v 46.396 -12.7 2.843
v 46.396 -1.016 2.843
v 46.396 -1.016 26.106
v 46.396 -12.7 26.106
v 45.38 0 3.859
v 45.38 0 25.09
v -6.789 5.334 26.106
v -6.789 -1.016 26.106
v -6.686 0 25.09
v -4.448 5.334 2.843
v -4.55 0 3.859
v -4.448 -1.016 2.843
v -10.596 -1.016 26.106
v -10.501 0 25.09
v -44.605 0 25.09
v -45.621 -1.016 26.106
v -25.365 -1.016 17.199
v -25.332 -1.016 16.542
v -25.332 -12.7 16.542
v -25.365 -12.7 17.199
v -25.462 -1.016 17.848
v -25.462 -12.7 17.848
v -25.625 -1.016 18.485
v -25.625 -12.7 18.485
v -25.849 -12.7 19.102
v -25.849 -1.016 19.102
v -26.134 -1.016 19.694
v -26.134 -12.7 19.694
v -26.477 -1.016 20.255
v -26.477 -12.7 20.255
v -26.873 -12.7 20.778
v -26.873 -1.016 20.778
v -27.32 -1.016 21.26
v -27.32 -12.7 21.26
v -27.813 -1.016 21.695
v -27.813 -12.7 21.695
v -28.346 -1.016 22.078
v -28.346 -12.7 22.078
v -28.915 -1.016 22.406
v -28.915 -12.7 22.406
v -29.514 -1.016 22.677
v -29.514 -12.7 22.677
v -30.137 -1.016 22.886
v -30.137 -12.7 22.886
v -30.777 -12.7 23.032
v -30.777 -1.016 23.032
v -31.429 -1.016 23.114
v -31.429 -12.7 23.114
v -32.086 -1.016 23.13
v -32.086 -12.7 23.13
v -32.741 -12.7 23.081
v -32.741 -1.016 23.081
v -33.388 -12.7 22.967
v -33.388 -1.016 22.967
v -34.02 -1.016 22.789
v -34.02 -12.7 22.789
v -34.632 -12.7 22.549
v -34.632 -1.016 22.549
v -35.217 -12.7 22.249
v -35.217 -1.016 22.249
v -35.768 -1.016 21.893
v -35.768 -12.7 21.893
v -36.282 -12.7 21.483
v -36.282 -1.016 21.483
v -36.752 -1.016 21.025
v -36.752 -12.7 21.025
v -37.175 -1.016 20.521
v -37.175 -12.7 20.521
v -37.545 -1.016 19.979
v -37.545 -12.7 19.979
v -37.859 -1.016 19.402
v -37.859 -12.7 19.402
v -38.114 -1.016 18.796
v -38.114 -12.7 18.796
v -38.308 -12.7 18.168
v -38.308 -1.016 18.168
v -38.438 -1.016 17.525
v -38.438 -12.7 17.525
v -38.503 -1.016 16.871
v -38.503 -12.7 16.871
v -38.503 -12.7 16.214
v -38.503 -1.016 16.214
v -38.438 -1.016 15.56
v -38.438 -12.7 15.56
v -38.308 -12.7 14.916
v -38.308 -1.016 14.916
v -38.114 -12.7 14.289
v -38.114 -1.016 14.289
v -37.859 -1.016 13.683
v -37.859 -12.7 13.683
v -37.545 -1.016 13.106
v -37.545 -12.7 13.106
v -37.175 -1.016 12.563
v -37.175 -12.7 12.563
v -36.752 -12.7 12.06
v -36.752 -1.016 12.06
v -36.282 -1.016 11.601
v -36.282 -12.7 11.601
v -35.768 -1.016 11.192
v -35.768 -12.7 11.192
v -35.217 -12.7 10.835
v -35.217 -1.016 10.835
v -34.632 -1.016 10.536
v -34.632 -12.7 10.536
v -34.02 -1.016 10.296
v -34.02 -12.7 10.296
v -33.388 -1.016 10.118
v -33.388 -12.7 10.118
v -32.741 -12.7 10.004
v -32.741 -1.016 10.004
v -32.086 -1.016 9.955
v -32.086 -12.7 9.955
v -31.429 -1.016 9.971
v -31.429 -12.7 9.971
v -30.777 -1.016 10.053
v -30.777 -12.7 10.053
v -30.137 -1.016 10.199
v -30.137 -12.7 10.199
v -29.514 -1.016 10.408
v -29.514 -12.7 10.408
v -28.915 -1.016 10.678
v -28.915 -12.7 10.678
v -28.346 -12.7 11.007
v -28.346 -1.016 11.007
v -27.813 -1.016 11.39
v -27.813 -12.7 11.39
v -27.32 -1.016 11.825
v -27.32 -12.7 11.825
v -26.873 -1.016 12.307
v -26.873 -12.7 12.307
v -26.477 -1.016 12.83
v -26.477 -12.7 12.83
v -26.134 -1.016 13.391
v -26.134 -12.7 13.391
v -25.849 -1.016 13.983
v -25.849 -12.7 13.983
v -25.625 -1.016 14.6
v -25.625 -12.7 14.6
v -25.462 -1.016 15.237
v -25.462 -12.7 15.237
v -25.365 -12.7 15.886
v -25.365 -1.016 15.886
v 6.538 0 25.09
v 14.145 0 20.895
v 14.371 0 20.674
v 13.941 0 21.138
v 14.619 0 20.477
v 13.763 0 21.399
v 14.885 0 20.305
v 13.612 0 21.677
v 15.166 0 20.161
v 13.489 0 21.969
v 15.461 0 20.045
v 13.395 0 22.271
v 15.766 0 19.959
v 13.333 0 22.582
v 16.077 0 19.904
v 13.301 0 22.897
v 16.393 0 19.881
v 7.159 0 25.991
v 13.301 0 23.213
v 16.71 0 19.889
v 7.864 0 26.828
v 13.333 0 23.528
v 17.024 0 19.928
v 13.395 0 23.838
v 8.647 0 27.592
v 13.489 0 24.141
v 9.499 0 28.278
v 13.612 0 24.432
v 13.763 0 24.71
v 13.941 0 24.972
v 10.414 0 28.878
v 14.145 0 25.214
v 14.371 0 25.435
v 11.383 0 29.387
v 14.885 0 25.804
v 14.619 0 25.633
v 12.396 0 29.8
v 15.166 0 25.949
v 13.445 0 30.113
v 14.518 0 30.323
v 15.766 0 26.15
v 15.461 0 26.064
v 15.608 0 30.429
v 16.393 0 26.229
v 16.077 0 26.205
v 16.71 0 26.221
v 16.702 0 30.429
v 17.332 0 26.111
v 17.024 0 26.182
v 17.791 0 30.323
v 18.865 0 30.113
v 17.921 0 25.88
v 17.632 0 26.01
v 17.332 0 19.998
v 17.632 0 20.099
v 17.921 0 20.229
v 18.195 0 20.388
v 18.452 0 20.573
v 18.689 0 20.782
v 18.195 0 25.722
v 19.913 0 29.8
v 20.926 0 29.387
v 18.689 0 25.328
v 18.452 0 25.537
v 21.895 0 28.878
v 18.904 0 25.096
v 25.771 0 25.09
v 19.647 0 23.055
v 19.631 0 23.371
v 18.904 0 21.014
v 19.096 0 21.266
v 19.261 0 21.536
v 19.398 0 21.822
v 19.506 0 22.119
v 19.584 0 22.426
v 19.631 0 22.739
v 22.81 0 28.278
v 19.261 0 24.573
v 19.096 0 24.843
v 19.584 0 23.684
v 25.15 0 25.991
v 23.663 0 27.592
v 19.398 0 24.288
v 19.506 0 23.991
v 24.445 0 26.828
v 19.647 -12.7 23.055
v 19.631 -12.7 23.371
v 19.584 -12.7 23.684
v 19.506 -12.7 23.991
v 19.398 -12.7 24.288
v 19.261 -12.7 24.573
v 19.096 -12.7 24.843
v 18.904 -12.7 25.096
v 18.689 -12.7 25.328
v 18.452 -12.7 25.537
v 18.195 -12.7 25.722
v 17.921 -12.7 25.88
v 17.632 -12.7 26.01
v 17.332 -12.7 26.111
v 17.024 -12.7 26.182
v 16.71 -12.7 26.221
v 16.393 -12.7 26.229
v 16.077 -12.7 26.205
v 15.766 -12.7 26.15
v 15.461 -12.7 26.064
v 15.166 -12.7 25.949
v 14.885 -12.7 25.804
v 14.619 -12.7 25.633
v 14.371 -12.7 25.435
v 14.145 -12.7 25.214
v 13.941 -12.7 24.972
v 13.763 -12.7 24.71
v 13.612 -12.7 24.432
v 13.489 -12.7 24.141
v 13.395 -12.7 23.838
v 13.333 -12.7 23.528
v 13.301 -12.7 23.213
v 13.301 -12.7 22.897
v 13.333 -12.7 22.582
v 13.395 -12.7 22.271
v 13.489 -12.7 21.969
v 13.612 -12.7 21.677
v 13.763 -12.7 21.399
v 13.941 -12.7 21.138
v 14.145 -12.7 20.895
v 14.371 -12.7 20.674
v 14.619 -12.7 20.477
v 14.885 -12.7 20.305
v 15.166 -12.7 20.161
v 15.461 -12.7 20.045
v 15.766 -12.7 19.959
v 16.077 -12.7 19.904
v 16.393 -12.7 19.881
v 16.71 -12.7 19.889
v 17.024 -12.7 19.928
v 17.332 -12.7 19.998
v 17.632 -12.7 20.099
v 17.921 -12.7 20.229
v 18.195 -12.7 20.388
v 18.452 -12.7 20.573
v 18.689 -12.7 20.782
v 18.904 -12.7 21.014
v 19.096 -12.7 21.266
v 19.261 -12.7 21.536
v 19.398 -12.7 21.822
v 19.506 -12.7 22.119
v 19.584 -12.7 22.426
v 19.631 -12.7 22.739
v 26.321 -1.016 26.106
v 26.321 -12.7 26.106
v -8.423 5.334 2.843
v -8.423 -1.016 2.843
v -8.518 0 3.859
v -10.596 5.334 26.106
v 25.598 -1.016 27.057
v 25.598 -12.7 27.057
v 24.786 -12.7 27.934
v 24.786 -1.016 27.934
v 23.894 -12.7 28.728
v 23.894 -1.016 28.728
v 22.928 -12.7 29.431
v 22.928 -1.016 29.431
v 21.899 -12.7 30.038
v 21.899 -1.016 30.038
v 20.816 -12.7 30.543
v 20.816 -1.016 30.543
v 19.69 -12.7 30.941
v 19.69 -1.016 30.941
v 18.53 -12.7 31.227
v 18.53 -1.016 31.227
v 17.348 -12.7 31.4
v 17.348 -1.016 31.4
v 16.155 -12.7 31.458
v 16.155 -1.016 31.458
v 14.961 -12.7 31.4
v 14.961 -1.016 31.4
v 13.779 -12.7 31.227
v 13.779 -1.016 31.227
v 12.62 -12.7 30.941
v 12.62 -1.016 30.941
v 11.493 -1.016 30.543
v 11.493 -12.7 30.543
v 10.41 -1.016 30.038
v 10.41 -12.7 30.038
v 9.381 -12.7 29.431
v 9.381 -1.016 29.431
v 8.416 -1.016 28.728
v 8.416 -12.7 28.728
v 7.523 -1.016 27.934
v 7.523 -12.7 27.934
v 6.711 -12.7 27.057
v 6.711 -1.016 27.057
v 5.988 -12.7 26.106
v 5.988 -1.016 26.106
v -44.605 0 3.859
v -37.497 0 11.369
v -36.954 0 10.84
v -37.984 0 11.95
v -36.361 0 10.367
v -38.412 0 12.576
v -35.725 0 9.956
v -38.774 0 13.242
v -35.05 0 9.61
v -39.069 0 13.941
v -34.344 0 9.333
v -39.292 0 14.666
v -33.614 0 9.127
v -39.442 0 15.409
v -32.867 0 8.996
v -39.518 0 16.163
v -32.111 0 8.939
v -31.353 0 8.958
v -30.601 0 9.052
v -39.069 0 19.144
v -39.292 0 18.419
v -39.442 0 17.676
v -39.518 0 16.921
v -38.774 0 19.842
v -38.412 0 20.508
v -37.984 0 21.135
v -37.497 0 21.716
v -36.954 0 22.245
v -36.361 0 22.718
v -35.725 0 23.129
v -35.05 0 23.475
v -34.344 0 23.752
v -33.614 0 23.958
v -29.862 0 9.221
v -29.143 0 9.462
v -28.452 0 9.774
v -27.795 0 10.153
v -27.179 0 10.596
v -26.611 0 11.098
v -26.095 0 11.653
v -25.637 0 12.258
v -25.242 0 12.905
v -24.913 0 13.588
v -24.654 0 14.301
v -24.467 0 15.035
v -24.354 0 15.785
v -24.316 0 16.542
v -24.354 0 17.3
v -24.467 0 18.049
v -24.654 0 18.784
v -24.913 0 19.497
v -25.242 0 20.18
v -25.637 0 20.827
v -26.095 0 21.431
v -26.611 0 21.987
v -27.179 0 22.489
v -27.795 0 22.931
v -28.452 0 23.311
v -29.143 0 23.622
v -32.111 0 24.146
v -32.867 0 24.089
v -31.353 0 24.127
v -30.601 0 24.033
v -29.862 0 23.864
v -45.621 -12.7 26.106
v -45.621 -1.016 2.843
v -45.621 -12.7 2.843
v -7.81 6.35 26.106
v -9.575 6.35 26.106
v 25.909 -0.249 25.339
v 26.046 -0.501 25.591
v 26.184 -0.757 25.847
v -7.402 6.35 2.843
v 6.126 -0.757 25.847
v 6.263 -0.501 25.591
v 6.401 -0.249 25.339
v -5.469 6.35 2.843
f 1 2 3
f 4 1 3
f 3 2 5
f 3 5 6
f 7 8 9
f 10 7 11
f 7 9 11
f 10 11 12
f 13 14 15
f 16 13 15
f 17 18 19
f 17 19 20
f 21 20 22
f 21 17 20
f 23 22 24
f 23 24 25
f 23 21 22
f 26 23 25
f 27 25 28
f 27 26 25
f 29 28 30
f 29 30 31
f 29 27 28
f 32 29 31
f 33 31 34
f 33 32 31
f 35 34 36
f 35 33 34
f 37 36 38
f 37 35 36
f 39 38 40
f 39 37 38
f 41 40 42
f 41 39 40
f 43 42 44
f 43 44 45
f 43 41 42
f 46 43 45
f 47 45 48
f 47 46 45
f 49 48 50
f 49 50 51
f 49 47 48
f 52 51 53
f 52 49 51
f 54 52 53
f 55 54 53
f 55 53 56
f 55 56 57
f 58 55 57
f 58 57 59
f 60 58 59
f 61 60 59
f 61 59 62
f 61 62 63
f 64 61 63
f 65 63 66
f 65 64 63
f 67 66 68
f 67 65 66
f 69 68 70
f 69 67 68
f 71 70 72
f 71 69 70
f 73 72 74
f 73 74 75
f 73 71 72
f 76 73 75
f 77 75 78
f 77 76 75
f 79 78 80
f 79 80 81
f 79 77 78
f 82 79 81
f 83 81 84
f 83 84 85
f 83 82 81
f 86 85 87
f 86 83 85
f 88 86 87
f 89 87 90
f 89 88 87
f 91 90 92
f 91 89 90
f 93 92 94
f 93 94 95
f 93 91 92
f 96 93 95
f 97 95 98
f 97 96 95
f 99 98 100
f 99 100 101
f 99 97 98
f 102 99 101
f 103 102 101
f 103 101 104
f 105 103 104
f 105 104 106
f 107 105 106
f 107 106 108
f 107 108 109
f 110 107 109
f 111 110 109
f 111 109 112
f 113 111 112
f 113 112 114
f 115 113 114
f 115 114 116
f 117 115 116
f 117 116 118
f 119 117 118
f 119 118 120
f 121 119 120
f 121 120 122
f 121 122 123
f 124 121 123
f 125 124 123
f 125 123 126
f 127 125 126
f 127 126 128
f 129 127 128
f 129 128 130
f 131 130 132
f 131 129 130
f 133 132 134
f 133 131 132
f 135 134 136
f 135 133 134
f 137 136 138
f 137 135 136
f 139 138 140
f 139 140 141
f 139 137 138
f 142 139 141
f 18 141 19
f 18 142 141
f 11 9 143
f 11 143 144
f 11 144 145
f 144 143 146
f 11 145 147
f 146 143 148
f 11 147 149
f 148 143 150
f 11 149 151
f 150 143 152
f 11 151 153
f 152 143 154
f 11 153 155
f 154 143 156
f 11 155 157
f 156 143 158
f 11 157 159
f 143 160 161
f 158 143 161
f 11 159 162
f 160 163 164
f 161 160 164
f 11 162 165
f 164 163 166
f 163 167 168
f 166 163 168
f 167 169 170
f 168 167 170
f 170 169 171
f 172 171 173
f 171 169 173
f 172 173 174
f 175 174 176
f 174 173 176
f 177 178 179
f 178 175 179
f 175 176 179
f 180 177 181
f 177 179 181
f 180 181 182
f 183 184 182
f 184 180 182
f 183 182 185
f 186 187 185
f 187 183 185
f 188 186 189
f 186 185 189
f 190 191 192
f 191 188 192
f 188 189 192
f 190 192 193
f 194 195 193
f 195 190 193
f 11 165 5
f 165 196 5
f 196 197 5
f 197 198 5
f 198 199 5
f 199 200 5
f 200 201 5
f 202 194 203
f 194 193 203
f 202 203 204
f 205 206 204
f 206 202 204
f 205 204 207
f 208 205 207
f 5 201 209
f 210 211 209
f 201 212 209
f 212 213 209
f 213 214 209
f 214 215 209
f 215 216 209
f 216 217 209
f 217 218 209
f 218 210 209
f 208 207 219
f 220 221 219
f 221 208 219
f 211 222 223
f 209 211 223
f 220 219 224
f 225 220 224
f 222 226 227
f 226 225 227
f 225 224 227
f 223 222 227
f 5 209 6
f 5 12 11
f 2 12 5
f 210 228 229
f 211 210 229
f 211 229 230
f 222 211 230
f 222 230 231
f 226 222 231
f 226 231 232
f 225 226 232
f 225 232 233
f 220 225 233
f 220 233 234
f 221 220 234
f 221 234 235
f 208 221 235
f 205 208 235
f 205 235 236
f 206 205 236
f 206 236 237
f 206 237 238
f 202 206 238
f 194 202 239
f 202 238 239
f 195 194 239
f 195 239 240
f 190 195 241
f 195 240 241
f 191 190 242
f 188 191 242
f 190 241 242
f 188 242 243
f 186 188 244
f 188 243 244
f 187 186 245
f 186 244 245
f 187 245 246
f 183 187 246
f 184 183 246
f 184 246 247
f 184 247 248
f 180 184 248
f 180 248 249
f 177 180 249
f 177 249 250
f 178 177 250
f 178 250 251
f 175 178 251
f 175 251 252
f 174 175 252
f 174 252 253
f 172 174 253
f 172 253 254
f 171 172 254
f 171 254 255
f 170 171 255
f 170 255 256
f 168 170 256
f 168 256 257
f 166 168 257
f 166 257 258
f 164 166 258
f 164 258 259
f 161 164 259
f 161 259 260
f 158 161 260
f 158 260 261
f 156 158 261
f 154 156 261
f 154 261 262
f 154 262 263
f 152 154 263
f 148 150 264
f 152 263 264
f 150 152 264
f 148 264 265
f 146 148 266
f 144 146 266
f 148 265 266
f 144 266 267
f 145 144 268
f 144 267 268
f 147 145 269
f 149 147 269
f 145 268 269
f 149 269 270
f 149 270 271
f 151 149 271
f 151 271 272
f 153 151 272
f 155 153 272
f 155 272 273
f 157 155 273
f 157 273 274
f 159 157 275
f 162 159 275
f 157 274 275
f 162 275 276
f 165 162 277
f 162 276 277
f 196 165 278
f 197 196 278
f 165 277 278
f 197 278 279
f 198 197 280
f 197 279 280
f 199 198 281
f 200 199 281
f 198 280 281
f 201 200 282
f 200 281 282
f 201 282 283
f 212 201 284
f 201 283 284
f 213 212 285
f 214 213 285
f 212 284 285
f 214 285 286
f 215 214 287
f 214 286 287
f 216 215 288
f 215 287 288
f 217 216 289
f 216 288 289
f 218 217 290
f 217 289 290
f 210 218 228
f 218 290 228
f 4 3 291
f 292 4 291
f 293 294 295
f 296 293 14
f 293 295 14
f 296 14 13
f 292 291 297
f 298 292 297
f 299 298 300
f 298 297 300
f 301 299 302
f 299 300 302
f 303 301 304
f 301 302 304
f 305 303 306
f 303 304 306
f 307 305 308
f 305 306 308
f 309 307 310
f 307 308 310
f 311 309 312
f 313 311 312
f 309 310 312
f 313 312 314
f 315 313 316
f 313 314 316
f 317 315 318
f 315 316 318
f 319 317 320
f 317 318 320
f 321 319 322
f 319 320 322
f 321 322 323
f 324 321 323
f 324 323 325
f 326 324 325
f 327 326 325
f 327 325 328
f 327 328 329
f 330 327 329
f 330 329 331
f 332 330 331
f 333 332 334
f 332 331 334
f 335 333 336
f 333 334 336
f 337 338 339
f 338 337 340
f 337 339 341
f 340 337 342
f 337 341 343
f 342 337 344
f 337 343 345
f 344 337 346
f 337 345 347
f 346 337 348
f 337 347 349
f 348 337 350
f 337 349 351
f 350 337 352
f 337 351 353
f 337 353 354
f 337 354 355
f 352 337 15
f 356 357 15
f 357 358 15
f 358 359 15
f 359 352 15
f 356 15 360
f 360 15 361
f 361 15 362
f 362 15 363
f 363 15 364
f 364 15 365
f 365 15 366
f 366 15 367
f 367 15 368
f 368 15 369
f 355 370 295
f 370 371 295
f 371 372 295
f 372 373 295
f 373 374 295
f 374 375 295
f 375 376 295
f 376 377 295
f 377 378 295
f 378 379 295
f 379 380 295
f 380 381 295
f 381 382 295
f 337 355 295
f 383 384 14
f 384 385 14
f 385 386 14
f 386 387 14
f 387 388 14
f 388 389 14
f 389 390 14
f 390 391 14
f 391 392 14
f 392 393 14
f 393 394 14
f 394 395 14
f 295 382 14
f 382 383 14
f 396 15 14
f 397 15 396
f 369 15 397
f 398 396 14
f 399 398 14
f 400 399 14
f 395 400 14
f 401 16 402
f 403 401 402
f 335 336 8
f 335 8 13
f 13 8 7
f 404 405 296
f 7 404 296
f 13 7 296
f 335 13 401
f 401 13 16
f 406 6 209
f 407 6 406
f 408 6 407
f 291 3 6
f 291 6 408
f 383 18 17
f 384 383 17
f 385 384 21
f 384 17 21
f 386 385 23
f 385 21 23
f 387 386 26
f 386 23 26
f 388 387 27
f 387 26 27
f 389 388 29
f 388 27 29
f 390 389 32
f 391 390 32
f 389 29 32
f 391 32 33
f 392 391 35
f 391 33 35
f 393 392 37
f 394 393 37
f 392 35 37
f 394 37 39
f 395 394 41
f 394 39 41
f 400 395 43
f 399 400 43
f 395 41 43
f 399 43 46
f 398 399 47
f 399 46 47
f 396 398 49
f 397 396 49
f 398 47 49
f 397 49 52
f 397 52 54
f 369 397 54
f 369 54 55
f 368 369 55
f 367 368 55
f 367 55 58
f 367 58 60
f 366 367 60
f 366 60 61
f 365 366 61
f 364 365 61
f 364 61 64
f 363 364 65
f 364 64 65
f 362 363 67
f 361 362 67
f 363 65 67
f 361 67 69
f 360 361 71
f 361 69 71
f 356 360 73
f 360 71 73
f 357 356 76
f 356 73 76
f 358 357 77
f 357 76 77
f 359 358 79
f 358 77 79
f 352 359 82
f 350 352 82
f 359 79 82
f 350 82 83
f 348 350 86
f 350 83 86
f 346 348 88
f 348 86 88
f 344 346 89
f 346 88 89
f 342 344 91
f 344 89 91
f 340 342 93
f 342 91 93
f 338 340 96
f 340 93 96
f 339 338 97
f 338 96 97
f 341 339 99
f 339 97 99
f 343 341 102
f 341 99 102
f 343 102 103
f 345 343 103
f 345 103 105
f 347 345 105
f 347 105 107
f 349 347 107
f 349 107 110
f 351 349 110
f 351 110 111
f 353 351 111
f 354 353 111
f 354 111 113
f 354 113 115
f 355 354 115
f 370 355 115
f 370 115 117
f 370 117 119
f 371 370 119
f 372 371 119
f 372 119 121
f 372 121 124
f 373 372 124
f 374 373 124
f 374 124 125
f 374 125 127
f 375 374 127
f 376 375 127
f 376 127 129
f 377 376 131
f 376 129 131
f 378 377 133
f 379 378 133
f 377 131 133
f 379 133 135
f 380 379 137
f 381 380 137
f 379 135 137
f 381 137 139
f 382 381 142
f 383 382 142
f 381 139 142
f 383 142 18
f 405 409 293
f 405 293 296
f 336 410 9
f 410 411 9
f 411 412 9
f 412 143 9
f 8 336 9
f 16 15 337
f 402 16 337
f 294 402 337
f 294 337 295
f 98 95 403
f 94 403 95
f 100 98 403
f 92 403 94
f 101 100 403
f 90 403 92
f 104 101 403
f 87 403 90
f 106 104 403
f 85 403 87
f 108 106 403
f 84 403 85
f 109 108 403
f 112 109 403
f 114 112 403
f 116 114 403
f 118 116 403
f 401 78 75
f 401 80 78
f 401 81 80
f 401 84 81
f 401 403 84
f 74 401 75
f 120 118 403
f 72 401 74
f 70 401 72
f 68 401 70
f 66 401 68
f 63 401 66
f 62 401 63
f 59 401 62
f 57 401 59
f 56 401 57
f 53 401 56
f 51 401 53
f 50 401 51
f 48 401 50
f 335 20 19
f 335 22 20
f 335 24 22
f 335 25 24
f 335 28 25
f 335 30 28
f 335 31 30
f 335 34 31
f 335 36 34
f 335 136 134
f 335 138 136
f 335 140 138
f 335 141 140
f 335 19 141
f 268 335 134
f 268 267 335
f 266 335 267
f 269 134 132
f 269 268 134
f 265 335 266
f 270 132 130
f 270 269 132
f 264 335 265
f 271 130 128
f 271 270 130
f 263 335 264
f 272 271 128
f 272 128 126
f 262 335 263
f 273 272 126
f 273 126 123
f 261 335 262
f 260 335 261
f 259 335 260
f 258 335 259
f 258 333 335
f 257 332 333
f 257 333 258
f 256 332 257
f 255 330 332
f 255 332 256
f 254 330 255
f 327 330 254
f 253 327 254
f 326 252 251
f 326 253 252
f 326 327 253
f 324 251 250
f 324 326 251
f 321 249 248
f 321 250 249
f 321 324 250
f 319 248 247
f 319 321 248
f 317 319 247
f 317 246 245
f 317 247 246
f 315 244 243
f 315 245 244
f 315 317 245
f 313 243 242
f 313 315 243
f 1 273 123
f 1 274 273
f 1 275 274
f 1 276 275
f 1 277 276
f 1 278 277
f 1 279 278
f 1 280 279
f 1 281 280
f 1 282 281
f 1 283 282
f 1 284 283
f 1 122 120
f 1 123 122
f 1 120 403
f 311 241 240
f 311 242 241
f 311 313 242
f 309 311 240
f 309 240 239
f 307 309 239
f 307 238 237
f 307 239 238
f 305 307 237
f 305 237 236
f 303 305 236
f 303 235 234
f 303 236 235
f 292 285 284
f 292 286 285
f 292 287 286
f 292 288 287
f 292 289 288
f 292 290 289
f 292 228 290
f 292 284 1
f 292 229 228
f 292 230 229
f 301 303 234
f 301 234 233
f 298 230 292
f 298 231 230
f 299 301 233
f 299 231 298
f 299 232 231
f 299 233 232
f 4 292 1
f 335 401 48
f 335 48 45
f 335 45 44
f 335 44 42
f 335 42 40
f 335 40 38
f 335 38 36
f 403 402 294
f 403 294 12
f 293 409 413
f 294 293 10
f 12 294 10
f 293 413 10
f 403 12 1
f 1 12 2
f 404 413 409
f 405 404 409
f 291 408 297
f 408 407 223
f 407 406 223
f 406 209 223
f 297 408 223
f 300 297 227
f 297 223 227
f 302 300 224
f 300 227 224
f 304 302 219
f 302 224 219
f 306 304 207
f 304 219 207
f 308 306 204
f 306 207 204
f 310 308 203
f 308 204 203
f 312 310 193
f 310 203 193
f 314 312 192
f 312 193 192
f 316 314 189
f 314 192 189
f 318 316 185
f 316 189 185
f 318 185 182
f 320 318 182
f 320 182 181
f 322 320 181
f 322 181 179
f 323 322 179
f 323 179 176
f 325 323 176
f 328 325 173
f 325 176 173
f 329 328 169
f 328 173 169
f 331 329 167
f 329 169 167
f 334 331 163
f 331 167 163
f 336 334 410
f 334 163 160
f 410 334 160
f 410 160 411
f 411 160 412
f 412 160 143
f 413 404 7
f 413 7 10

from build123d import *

# Parameters (mm, degrees)
F0_R     = 6.5898328627
F1_DEPTH = 12.7
F3_DEPTH = 6.35
F4_SIZE  = 1.016
F6_D     = 6.35


with BuildPart() as f1:
    # F0 (on Front) → F1 (new body)
    with BuildSketch(Plane.XZ):
        with BuildLine():
            Line((5.9883656788, 26.1059254408), (-45.6207543612, 26.1059254408))
            Line((-45.6207543612, 26.1059254408), (-45.6207543612, 2.8432162944))
            Line((-45.6207543612, 2.8432162944), (46.3961809874, 2.8432162944))
            Line((46.3961809874, 2.8432162944), (46.3961809874, 26.1059254408))
            Line((46.3961809874, 26.1059254408), (26.3209578705, 26.1059254408))
            ThreePointArc((26.3209578705, 26.1059254408), (27.9321742637, 22.7805506138), (28.4858180464, 19.127111882))
            ThreePointArc((28.4858180464, 19.127111882), (12.5012230428, 7.3495993929), (5.9883656788, 26.1059254408))
        make_face()
        with Locations((-31.9216027856, 16.5423676372)):
            Circle(F0_R, mode=Mode.SUBTRACT)
        with BuildLine():
            ThreePointArc((26.3209578705, 26.1059254408), (16.1546617746, 31.4582681537), (5.9883656788, 26.1059254408))
            Line((5.9883656788, 26.1059254408), (26.3209578705, 26.1059254408))
        make_face()
        with BuildLine():
            Line((26.3209578705, 26.1059254408), (5.9883656788, 26.1059254408))
            ThreePointArc((5.9883656788, 26.1059254408), (12.5012230428, 7.3495993929), (28.4858180464, 19.127111882))
            ThreePointArc((28.4858180464, 19.127111882), (27.9321742637, 22.7805506138), (26.3209578705, 26.1059254408))
        make_face()
    extrude(amount=F1_DEPTH)

    # F2 (on face) → F3 (join)
    with BuildSketch(Plane(origin=(0, 0, 0), x_dir=(-1, 0, 0), z_dir=(0, 1, 0))):
        Polygon((6.7886244506, 26.1059254408), (4.4478680938, 2.8432162944), (8.4228813648, 2.8432162944), (10.5955973268, 26.1059254408), align=None)
    extrude(amount=F3_DEPTH)

    # F4
    f4_edges = [f1.edges().sort_by_distance(p)[0] for p in [
        (-9.509239, 6.35, 14.474571),
        (-5.618246, 6.35, 14.474571),
        (20.974156, 0, 2.843216),
        (-27.021818, 0, 2.843216),
        (-38.511436, 0, 16.542368),
        (16.154662, 0, 31.458268),
        (-0.400129, 0, 26.105925),
        (-28.108176, 0, 26.105925),
        (-45.620754, 0, 14.474571),
        (46.396181, 0, 14.474571),
        (36.358569, 0, 26.105925),
    ]]
    chamfer(f4_edges, length=F4_SIZE)

    # F6 (through all)
    with Locations(Plane(origin=(0, 0, 0), x_dir=(-1, 0, 0), z_dir=(0, 1, 0))):
        with Locations((-16.4722520858, 23.0548288673)):
            Hole(F6_D / 2)


solid = f1.part
